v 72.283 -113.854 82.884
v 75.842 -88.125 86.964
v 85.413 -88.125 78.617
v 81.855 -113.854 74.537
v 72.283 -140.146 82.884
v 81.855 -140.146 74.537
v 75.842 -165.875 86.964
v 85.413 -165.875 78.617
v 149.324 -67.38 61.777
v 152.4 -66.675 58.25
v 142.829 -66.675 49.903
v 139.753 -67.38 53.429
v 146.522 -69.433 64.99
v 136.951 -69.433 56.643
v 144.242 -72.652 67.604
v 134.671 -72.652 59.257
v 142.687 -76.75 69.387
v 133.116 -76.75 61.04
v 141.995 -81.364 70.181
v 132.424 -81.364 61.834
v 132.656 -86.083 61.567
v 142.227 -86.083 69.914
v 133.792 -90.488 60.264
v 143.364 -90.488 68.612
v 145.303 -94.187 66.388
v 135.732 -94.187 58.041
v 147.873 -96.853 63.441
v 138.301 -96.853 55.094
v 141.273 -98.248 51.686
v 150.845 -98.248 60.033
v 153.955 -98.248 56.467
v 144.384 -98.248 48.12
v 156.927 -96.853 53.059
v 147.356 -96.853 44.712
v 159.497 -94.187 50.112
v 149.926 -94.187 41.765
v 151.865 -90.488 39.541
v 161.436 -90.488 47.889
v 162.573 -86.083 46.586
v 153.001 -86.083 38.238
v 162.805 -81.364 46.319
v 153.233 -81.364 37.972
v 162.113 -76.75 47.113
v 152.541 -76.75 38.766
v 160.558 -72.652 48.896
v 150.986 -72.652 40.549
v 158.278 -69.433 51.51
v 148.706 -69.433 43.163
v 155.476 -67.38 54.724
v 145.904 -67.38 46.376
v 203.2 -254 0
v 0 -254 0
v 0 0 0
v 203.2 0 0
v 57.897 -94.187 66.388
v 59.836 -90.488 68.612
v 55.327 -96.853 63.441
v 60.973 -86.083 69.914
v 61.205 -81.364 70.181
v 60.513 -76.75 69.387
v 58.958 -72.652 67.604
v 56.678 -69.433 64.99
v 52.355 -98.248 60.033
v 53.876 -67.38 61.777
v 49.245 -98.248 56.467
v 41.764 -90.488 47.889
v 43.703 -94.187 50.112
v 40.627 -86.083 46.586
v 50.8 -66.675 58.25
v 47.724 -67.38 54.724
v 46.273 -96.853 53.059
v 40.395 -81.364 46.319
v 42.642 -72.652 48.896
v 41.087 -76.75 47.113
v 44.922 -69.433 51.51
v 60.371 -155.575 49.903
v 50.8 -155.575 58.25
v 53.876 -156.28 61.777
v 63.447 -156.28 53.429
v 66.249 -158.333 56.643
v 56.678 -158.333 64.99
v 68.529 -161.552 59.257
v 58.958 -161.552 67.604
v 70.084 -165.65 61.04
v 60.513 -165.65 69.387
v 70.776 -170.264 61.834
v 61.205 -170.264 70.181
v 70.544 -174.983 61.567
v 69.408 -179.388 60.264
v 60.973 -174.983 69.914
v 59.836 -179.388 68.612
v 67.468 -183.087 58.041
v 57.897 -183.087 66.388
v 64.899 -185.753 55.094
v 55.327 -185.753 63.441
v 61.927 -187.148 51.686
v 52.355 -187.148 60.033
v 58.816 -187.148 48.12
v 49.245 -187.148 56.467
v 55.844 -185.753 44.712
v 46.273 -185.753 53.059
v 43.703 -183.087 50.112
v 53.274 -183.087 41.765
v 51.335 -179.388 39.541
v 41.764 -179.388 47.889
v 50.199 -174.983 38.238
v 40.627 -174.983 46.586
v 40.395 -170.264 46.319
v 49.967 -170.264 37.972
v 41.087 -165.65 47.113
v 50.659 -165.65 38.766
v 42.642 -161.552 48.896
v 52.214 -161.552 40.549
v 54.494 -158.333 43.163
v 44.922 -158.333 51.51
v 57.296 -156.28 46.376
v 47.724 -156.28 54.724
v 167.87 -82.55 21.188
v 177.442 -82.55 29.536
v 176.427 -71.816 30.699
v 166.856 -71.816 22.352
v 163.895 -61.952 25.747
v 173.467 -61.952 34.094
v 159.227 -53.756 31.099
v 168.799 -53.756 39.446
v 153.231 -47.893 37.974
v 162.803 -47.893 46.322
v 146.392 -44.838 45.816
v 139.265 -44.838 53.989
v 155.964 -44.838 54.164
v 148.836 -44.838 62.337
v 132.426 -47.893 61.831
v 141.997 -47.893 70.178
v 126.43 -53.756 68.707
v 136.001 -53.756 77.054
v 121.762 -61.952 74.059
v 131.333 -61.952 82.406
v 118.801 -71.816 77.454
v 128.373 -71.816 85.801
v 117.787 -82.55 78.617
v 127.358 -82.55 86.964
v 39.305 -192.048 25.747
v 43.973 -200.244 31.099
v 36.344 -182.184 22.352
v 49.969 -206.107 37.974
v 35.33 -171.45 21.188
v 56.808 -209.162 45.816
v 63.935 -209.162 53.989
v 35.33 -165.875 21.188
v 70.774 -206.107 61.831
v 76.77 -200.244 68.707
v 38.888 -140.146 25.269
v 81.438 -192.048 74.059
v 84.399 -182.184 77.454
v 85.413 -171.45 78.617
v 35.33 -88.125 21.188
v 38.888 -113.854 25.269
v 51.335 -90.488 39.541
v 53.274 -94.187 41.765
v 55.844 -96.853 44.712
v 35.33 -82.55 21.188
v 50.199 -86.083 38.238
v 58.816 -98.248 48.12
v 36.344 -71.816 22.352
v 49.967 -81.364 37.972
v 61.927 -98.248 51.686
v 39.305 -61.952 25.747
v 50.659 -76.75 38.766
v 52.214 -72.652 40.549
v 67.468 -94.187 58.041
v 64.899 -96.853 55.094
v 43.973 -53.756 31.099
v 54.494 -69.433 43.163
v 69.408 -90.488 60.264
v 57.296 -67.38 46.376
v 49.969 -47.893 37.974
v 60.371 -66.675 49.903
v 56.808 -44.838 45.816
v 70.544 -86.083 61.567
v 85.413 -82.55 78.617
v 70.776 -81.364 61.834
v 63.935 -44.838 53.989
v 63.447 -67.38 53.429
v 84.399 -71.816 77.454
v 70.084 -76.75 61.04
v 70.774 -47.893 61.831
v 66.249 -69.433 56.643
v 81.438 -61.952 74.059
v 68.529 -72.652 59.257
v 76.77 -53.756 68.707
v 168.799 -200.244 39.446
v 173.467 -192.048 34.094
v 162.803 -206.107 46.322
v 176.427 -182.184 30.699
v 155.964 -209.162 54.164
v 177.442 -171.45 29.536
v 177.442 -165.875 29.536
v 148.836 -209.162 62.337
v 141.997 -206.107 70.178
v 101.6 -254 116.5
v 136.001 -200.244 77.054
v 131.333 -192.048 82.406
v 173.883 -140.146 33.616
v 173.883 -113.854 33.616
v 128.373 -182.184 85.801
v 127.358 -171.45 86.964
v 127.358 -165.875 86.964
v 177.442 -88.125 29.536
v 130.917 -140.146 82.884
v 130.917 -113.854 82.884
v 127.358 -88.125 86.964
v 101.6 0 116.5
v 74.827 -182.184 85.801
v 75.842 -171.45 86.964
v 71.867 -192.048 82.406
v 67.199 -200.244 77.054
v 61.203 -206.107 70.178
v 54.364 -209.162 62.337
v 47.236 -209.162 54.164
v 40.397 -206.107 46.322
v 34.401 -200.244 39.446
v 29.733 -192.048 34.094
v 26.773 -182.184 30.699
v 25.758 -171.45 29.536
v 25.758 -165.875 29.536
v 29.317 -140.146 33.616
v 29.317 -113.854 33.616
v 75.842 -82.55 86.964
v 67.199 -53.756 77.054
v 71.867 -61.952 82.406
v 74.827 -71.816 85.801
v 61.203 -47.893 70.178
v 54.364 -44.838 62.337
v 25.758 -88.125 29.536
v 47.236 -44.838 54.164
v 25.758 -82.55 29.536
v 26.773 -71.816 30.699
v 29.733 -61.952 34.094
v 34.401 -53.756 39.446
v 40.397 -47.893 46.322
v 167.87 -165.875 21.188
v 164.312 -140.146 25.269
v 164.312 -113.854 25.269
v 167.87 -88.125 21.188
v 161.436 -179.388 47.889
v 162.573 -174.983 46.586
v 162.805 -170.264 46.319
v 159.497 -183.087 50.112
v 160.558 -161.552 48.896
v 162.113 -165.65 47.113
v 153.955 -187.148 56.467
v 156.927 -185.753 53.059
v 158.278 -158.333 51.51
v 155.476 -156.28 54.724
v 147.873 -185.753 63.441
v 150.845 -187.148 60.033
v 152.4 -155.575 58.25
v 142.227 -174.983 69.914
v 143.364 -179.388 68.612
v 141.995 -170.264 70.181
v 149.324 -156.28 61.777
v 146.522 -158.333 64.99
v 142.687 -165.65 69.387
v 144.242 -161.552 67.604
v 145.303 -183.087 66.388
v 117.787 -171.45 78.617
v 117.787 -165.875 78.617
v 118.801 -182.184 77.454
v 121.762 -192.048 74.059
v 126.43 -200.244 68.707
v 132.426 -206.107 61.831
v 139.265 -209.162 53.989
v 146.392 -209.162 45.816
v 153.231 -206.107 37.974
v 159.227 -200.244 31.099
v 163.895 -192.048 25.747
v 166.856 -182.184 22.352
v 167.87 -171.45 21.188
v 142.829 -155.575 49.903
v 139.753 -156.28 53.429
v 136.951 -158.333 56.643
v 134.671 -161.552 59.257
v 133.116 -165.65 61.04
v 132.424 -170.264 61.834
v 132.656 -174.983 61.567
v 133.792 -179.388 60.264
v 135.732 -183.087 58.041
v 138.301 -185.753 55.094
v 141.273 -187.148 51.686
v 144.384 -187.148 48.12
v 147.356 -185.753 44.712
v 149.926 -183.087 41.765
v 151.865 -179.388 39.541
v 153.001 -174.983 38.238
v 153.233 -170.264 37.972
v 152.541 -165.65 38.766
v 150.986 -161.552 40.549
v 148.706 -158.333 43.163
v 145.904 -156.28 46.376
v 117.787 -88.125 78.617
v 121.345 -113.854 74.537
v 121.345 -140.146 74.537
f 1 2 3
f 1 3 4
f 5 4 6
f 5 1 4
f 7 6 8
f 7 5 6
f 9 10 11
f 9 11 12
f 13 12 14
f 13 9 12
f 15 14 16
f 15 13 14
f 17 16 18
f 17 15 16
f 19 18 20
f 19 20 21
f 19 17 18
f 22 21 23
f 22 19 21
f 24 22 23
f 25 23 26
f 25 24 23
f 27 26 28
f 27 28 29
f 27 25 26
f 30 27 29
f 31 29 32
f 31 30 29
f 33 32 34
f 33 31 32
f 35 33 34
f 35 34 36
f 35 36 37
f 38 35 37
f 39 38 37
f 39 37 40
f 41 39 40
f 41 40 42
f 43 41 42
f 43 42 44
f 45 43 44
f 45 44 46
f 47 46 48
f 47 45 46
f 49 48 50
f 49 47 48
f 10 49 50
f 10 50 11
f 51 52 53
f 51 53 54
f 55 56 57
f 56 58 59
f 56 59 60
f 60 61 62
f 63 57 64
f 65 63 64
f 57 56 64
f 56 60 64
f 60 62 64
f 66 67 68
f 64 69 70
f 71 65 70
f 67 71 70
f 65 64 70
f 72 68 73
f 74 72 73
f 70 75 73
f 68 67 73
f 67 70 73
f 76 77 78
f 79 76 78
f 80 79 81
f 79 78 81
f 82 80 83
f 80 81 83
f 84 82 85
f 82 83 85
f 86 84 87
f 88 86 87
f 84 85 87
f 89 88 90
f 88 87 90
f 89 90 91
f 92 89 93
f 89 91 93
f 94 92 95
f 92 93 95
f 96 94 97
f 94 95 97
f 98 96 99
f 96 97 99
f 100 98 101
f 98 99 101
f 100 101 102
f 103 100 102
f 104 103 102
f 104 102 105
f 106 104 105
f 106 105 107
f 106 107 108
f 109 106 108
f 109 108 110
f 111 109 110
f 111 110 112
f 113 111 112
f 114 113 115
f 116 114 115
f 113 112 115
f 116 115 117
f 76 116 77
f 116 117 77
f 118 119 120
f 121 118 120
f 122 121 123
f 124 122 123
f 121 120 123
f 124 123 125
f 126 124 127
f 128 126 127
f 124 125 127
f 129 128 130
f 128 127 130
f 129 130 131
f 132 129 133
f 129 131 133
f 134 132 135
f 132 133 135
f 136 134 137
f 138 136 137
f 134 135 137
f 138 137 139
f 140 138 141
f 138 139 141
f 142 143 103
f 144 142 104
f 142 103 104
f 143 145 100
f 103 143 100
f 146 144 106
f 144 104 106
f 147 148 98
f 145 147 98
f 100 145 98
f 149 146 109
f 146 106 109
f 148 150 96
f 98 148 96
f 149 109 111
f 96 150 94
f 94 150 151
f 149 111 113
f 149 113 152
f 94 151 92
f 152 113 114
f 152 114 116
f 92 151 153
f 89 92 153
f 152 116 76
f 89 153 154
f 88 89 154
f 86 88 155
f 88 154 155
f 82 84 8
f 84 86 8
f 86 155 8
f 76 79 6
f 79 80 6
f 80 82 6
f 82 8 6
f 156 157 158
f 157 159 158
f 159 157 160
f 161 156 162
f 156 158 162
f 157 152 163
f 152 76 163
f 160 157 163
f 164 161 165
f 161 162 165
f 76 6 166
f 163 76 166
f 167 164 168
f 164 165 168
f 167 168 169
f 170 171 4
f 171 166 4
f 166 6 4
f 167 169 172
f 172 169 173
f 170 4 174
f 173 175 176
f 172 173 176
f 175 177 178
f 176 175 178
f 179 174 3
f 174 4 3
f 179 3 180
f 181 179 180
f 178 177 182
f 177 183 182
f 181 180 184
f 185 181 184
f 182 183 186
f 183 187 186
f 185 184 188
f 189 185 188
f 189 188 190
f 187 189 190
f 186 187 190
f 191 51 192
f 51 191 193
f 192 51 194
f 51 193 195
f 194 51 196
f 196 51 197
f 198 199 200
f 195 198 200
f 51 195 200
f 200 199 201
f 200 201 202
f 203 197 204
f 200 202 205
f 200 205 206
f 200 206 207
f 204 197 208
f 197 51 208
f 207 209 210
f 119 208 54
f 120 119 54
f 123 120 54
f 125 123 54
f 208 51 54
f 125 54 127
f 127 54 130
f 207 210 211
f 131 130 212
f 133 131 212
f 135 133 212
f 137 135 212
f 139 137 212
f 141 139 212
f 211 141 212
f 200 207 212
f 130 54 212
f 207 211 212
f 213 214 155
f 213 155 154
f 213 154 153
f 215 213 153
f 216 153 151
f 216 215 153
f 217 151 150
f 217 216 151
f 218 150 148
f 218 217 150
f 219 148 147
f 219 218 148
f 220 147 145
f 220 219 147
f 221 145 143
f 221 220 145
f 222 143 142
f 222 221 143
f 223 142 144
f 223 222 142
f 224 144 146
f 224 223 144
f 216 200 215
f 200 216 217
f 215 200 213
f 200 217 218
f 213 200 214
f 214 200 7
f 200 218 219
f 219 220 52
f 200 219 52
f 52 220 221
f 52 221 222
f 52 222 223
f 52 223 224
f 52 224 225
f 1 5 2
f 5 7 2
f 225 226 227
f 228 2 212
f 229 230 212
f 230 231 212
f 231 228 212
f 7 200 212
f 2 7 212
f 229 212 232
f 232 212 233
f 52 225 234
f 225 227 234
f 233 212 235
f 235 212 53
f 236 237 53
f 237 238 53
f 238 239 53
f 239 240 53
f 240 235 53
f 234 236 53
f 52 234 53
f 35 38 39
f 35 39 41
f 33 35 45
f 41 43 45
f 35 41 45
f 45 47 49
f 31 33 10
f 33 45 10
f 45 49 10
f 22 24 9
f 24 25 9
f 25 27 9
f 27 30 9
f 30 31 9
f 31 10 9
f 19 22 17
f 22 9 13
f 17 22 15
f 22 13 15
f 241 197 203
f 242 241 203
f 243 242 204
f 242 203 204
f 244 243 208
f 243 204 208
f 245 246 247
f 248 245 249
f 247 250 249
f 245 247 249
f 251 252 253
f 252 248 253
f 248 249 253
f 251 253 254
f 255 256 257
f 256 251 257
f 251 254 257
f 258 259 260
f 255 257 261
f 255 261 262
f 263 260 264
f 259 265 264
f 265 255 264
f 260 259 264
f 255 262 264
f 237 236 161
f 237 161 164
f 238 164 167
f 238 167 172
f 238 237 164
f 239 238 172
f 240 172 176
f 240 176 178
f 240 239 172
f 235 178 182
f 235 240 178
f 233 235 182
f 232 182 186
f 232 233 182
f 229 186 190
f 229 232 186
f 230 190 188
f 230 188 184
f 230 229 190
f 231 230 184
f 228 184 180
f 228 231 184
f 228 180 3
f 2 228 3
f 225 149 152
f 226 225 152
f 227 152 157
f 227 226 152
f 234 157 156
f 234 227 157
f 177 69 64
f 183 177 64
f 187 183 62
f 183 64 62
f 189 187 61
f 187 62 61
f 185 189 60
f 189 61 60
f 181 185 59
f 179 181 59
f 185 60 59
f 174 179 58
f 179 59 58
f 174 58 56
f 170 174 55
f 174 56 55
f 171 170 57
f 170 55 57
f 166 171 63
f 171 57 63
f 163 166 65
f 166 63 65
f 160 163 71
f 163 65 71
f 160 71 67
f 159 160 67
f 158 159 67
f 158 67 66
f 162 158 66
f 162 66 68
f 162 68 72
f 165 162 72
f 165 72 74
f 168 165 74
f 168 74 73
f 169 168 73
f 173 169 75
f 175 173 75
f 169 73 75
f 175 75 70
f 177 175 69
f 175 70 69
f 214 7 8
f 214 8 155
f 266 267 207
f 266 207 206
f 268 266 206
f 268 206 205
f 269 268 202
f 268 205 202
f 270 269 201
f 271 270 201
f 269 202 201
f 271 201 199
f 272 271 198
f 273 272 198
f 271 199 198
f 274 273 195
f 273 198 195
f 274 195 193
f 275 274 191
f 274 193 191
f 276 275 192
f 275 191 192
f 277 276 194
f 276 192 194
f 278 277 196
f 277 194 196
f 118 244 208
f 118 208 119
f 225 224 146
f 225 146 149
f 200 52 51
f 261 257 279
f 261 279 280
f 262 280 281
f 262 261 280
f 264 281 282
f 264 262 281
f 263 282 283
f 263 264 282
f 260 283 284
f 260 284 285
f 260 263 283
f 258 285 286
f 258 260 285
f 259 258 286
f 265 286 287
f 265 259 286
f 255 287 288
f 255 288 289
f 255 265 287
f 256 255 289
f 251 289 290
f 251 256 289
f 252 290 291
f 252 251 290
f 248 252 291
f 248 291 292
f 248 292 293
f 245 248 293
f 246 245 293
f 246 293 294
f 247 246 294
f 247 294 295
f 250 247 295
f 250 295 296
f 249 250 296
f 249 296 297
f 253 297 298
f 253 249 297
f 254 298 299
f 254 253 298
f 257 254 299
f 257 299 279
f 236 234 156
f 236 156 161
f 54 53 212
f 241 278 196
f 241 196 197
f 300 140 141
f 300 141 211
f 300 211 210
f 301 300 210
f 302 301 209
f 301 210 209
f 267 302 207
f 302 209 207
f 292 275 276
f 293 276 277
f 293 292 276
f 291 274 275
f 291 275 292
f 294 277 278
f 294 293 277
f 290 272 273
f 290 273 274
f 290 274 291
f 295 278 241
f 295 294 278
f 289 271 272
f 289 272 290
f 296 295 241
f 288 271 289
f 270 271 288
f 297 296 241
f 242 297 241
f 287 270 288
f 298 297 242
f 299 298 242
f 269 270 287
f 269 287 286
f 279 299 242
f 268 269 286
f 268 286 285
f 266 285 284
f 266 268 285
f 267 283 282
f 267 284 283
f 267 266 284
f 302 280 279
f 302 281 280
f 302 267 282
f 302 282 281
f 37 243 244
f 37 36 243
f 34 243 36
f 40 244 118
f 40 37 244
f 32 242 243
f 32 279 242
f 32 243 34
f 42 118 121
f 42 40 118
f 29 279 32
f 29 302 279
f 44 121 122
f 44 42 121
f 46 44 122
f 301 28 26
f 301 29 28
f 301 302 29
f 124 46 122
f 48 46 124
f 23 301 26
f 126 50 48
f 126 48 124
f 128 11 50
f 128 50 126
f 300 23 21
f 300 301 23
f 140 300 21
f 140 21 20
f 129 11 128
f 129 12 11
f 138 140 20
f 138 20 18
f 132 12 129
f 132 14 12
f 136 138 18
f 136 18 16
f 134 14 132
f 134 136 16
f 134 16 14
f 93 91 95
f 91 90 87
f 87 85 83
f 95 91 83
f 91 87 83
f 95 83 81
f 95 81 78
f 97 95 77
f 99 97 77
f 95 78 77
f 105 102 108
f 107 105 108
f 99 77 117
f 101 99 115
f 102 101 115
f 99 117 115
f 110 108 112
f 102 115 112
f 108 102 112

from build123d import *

# Parameters (mm, degrees)
F1_DEPTH = 254
F2_R     = 15.875
F3_DEPTH = 12.7


# Not quite as in the source:
# - a pattern or mirror of a feature is missing from the dataset's text; its kind, count and spacing are read off the source's solid


with BuildPart() as f1:
    # F0 (on Front) → F1 (new body)
    with BuildSketch(Plane.XZ):
        Polygon((101.6, 116.5001839399), (0, 0), (203.2, 0), align=None)
    extrude(amount=F1_DEPTH)

    # F2 (on face) → F3 (cut)
    with BuildSketch(Plane(origin=(115.4177397592, 0, 100.6559986685), x_dir=(0, 1, 0), z_dir=(0.7536582036, 0, 0.6572665458))):
        with BuildLine():
            Line((-165.875079947, -18.1667619065), (-171.45, -18.1667619065))
            ThreePointArc((-171.45, -18.1667619065), (-209.55, -56.2667619065), (-171.45, -94.3667619065))
            Line((-171.45, -94.3667619065), (-165.875079947, -94.3667619065))
            ThreePointArc((-165.875079947, -94.3667619065), (-127, -88.270559031), (-88.124920053, -94.3667619065))
            Line((-88.124920053, -94.3667619065), (-82.55, -94.3667619065))
            ThreePointArc((-82.55, -94.3667619065), (-44.45, -56.2667619065), (-82.55, -18.1667619065))
            Line((-82.55, -18.1667619065), (-88.124920053, -18.1667619065))
            ThreePointArc((-88.124920053, -18.1667619065), (-127, -24.262964782), (-165.875079947, -18.1667619065))
        make_face()
        with Locations((-171.45, -56.2667619065)):
            Circle(F2_R, mode=Mode.SUBTRACT)
        with Locations((-82.55, -56.2667619065)):
            Circle(F2_R, mode=Mode.SUBTRACT)
    f3 = extrude(amount=-F3_DEPTH, mode=Mode.SUBTRACT)

    # F3_copies: F3 across plane
    add(f3.mirror(Plane(origin=(101.6, 0, 0), x_dir=(0, 0, -1), z_dir=(-1, 0, 0))), mode=Mode.SUBTRACT)


solid = f1.part
